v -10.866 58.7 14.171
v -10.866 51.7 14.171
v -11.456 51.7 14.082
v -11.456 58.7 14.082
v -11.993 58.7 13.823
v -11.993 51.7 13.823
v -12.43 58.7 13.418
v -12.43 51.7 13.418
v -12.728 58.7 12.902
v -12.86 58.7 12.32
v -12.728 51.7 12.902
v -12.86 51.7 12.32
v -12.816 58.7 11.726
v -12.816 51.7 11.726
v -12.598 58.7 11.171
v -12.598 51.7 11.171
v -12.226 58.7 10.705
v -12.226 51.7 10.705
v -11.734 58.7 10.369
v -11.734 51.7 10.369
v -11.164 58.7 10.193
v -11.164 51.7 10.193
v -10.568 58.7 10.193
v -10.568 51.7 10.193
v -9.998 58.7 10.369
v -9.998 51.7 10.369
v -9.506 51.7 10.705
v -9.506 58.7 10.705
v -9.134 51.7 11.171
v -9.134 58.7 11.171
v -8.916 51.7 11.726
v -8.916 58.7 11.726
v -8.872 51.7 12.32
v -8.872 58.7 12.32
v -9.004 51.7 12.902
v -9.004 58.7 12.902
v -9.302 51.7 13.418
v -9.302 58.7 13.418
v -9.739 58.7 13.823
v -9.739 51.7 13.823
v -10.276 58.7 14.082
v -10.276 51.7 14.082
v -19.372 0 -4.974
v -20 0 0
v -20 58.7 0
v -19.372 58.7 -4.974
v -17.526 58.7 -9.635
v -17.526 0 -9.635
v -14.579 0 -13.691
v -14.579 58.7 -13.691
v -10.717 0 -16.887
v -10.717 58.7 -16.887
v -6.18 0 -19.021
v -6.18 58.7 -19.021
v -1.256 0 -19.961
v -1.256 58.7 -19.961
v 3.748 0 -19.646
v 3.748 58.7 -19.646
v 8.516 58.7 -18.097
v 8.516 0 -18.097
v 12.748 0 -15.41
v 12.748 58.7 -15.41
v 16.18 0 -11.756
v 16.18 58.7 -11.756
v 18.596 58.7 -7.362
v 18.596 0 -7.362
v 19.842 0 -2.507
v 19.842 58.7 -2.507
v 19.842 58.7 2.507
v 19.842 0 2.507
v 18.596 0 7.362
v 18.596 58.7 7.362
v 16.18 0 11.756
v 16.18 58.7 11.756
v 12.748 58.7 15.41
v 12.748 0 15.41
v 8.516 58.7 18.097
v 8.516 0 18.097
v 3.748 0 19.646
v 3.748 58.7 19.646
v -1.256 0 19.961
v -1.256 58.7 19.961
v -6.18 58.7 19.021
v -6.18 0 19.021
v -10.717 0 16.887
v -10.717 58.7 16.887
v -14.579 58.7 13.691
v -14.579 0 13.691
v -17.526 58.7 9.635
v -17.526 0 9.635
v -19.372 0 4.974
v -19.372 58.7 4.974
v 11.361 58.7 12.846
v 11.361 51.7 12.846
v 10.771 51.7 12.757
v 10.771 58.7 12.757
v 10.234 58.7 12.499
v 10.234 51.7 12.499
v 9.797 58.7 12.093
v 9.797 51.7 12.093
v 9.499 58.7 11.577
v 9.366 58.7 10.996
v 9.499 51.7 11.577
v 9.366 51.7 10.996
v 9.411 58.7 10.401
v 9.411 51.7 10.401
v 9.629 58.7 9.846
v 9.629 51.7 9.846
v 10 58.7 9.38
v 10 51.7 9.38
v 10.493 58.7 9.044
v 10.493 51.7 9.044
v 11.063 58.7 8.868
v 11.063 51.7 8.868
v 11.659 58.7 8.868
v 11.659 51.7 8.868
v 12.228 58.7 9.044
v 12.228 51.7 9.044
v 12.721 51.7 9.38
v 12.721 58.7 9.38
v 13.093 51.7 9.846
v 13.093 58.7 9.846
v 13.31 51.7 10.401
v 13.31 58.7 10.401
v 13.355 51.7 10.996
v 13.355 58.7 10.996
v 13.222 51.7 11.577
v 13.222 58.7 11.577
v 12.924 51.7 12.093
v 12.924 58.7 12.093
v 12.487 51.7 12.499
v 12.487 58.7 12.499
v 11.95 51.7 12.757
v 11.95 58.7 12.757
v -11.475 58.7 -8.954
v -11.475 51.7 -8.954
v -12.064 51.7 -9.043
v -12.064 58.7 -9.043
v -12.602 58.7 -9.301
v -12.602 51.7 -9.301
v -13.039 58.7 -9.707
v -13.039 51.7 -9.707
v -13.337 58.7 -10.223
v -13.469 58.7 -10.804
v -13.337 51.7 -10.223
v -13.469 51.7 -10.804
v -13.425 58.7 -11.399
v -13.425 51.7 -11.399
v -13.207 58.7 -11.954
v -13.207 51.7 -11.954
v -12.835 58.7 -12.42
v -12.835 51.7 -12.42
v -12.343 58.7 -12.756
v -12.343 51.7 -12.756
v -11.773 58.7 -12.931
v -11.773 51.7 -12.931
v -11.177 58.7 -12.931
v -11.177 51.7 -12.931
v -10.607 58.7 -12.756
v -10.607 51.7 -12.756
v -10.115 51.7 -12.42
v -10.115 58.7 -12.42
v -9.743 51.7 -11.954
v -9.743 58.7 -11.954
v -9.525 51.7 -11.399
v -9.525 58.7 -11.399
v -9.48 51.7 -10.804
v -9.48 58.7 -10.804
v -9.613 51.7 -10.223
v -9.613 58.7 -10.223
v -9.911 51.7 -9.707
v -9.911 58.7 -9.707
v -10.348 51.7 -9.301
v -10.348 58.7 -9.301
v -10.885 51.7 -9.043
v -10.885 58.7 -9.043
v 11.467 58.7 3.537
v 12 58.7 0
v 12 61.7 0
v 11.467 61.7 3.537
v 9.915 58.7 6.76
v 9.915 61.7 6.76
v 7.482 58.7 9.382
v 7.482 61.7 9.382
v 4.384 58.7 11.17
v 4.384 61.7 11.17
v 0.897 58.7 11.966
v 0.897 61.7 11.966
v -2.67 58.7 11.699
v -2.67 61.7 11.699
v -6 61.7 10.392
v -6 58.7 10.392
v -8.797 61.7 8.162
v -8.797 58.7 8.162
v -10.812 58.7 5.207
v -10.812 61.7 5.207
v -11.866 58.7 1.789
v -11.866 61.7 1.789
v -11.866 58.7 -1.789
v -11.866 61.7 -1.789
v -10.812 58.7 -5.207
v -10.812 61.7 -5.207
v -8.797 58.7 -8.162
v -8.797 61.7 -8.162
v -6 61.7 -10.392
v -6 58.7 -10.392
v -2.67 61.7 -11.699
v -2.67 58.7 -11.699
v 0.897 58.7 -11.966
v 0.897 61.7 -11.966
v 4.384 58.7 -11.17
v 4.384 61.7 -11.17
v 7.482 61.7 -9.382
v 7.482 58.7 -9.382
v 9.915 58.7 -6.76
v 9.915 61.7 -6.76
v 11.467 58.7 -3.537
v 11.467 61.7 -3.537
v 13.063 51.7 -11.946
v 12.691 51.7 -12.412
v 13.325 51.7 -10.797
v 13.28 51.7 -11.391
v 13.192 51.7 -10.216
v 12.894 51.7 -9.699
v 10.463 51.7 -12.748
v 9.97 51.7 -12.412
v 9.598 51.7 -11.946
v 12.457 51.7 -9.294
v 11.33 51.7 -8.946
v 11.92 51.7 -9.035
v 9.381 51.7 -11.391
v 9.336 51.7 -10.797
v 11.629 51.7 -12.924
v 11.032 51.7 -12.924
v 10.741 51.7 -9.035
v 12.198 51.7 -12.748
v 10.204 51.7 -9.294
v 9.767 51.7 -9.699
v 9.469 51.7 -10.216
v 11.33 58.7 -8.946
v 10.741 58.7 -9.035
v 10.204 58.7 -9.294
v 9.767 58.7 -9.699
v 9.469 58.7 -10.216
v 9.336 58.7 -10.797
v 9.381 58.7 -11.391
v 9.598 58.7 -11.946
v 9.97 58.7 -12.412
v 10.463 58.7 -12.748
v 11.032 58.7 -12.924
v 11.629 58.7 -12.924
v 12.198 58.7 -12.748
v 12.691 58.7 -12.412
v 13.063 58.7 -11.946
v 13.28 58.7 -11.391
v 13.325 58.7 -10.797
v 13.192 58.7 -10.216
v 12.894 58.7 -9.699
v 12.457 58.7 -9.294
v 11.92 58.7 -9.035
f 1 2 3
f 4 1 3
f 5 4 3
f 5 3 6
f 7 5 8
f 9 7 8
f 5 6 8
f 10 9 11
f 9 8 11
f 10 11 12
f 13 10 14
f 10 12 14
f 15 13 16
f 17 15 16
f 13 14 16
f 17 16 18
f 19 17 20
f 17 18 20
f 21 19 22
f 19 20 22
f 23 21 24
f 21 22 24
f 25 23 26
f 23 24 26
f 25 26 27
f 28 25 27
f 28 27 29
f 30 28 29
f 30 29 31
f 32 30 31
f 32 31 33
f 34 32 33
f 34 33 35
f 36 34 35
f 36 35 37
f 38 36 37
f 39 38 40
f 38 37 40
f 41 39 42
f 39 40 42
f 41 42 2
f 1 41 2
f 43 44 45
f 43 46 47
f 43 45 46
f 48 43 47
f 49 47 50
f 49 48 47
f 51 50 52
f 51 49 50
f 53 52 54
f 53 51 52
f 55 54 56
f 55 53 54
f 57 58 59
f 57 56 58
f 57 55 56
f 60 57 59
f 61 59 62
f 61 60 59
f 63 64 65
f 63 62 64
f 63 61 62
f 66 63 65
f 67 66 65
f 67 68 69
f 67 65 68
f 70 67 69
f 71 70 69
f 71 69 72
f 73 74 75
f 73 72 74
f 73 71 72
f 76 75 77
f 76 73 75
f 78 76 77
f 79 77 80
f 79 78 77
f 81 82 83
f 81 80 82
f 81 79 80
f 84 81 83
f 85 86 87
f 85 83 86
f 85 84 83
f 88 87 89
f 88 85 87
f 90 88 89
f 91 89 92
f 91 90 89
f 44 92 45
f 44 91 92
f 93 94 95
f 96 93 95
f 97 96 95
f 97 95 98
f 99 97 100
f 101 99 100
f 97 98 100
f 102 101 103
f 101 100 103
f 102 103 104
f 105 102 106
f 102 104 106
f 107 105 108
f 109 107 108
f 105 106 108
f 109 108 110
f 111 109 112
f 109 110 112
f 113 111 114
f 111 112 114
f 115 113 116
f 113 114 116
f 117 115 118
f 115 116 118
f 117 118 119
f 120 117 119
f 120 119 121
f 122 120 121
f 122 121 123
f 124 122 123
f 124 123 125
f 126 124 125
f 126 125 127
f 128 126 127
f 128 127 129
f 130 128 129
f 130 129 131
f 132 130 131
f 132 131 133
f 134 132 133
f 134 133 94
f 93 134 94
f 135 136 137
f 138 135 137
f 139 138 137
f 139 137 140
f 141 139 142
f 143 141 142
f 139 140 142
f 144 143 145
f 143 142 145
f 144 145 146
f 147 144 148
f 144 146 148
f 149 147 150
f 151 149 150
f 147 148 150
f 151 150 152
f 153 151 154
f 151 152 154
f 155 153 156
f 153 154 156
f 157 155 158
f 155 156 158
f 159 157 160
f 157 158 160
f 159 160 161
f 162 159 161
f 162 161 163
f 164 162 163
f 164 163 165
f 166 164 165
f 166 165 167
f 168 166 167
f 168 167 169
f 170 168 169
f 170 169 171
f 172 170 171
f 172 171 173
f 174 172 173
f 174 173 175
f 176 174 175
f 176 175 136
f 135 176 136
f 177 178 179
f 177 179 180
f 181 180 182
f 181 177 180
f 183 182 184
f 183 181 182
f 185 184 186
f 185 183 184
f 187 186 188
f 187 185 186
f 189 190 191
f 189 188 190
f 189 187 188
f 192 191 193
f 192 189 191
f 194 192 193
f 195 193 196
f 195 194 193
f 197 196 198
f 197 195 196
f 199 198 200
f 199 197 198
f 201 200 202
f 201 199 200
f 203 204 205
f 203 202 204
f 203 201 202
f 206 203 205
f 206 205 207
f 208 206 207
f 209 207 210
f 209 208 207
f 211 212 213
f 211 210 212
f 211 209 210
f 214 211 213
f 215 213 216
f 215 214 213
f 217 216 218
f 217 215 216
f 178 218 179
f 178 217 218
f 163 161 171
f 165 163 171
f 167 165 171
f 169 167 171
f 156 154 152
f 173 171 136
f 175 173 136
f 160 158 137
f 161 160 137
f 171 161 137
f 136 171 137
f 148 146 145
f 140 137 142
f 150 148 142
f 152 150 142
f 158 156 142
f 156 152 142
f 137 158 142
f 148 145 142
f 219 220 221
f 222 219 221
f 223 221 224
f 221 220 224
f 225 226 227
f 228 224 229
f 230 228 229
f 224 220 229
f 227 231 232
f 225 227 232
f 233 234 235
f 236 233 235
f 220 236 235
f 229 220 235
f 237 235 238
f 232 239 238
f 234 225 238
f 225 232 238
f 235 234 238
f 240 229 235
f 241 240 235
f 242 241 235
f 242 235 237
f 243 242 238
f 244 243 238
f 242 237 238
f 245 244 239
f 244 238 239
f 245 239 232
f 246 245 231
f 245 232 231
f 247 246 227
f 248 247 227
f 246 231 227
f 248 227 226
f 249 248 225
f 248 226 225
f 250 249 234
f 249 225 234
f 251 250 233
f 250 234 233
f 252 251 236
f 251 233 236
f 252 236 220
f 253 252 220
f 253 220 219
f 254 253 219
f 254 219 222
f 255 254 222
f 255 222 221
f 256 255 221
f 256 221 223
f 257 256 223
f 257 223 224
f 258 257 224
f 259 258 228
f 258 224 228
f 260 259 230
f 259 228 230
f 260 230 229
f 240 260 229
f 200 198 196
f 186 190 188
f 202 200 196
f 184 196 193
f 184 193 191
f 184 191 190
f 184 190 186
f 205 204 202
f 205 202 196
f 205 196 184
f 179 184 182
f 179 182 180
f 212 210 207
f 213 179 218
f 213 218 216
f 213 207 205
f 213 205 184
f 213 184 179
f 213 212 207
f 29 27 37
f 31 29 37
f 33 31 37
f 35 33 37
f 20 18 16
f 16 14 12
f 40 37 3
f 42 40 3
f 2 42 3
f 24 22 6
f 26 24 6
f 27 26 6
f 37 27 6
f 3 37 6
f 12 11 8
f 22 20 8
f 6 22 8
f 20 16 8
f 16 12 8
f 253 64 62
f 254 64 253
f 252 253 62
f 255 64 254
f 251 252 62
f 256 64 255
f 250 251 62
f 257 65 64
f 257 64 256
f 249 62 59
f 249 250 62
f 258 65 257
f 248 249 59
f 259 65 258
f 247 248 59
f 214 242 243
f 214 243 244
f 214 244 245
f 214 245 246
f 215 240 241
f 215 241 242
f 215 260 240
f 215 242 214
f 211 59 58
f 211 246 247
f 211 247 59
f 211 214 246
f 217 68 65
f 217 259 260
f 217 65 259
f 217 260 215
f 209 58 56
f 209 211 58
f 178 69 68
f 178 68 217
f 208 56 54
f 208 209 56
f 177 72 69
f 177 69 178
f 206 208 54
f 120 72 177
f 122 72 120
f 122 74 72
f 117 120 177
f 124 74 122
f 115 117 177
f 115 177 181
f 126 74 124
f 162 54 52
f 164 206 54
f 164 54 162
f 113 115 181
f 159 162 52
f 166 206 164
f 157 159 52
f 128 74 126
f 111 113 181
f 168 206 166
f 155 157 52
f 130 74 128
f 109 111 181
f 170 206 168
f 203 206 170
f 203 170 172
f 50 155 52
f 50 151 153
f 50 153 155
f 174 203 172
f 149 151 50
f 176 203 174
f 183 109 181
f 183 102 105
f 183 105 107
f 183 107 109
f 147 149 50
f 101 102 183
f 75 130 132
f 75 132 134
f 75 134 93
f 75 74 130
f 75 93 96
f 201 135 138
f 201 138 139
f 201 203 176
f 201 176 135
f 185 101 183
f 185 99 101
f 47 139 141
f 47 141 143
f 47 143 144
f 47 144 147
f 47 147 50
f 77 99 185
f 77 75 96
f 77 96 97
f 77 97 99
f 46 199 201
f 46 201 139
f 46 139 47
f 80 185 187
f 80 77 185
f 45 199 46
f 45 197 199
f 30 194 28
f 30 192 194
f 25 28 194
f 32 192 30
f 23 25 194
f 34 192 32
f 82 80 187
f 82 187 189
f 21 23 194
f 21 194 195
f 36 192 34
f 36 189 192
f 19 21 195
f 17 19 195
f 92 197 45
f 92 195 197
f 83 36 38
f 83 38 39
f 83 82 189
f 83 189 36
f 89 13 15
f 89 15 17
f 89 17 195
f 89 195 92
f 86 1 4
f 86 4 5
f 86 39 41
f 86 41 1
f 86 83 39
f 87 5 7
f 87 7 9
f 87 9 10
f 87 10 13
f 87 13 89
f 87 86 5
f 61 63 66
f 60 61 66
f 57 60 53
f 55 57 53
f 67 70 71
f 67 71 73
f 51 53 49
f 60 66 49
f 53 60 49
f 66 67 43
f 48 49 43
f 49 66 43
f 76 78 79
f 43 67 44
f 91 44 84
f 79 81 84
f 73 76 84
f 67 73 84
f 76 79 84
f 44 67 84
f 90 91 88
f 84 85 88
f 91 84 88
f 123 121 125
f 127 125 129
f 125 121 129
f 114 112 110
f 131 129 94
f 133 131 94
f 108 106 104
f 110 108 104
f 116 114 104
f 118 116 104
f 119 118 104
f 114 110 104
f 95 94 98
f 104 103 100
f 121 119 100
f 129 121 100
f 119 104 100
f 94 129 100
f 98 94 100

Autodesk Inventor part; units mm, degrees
ref_plane "YZ Plane" through (0, 0, 0) normal (1, 0, 0) x (0, 1, 0)
ref_plane "XZ Plane" through (0, 0, 0) normal (0, 1, 0) x (-1, 0, 0)
ref_plane "XY Plane" through (0, 0, 0) normal (0, 0, 1) x (1, 0, 0)
sketch "スケッチ1" plane through (0, 0, 0) normal (0, 1, 0) x (-1, 0, 0)
  circle A0 centre (0, 0) radius 20
  dimension "d0" = 40
extrude "押し出し1" add sketch "スケッチ1" along normal blind 58.7
sketch "スケッチ2" plane through (0, 58.7, 0) normal (0, 1, 0) x (1, 0, 0)
  circle A0 centre (0, 0) radius 12
  dimension "d3" = 24
extrude "押し出し2" add sketch "スケッチ2" along normal blind 3
hole "穴1" at (11.3305, 58.7, -10.9462) direction (0, -1, 0) diameter 4 depth 7
hole "穴2" at (-10.866, 58.7, 12.1709) direction (0, -1, 0) diameter 4 depth 7
hole "穴3" at (-11.4749, 58.7, -10.9538) direction (0, -1, 0) diameter 4 depth 7
hole "穴4" at (11.3606, 58.7, 10.8461) direction (0, -1, 0) diameter 4 depth 7
properties part number "HarmonicDrive1"
